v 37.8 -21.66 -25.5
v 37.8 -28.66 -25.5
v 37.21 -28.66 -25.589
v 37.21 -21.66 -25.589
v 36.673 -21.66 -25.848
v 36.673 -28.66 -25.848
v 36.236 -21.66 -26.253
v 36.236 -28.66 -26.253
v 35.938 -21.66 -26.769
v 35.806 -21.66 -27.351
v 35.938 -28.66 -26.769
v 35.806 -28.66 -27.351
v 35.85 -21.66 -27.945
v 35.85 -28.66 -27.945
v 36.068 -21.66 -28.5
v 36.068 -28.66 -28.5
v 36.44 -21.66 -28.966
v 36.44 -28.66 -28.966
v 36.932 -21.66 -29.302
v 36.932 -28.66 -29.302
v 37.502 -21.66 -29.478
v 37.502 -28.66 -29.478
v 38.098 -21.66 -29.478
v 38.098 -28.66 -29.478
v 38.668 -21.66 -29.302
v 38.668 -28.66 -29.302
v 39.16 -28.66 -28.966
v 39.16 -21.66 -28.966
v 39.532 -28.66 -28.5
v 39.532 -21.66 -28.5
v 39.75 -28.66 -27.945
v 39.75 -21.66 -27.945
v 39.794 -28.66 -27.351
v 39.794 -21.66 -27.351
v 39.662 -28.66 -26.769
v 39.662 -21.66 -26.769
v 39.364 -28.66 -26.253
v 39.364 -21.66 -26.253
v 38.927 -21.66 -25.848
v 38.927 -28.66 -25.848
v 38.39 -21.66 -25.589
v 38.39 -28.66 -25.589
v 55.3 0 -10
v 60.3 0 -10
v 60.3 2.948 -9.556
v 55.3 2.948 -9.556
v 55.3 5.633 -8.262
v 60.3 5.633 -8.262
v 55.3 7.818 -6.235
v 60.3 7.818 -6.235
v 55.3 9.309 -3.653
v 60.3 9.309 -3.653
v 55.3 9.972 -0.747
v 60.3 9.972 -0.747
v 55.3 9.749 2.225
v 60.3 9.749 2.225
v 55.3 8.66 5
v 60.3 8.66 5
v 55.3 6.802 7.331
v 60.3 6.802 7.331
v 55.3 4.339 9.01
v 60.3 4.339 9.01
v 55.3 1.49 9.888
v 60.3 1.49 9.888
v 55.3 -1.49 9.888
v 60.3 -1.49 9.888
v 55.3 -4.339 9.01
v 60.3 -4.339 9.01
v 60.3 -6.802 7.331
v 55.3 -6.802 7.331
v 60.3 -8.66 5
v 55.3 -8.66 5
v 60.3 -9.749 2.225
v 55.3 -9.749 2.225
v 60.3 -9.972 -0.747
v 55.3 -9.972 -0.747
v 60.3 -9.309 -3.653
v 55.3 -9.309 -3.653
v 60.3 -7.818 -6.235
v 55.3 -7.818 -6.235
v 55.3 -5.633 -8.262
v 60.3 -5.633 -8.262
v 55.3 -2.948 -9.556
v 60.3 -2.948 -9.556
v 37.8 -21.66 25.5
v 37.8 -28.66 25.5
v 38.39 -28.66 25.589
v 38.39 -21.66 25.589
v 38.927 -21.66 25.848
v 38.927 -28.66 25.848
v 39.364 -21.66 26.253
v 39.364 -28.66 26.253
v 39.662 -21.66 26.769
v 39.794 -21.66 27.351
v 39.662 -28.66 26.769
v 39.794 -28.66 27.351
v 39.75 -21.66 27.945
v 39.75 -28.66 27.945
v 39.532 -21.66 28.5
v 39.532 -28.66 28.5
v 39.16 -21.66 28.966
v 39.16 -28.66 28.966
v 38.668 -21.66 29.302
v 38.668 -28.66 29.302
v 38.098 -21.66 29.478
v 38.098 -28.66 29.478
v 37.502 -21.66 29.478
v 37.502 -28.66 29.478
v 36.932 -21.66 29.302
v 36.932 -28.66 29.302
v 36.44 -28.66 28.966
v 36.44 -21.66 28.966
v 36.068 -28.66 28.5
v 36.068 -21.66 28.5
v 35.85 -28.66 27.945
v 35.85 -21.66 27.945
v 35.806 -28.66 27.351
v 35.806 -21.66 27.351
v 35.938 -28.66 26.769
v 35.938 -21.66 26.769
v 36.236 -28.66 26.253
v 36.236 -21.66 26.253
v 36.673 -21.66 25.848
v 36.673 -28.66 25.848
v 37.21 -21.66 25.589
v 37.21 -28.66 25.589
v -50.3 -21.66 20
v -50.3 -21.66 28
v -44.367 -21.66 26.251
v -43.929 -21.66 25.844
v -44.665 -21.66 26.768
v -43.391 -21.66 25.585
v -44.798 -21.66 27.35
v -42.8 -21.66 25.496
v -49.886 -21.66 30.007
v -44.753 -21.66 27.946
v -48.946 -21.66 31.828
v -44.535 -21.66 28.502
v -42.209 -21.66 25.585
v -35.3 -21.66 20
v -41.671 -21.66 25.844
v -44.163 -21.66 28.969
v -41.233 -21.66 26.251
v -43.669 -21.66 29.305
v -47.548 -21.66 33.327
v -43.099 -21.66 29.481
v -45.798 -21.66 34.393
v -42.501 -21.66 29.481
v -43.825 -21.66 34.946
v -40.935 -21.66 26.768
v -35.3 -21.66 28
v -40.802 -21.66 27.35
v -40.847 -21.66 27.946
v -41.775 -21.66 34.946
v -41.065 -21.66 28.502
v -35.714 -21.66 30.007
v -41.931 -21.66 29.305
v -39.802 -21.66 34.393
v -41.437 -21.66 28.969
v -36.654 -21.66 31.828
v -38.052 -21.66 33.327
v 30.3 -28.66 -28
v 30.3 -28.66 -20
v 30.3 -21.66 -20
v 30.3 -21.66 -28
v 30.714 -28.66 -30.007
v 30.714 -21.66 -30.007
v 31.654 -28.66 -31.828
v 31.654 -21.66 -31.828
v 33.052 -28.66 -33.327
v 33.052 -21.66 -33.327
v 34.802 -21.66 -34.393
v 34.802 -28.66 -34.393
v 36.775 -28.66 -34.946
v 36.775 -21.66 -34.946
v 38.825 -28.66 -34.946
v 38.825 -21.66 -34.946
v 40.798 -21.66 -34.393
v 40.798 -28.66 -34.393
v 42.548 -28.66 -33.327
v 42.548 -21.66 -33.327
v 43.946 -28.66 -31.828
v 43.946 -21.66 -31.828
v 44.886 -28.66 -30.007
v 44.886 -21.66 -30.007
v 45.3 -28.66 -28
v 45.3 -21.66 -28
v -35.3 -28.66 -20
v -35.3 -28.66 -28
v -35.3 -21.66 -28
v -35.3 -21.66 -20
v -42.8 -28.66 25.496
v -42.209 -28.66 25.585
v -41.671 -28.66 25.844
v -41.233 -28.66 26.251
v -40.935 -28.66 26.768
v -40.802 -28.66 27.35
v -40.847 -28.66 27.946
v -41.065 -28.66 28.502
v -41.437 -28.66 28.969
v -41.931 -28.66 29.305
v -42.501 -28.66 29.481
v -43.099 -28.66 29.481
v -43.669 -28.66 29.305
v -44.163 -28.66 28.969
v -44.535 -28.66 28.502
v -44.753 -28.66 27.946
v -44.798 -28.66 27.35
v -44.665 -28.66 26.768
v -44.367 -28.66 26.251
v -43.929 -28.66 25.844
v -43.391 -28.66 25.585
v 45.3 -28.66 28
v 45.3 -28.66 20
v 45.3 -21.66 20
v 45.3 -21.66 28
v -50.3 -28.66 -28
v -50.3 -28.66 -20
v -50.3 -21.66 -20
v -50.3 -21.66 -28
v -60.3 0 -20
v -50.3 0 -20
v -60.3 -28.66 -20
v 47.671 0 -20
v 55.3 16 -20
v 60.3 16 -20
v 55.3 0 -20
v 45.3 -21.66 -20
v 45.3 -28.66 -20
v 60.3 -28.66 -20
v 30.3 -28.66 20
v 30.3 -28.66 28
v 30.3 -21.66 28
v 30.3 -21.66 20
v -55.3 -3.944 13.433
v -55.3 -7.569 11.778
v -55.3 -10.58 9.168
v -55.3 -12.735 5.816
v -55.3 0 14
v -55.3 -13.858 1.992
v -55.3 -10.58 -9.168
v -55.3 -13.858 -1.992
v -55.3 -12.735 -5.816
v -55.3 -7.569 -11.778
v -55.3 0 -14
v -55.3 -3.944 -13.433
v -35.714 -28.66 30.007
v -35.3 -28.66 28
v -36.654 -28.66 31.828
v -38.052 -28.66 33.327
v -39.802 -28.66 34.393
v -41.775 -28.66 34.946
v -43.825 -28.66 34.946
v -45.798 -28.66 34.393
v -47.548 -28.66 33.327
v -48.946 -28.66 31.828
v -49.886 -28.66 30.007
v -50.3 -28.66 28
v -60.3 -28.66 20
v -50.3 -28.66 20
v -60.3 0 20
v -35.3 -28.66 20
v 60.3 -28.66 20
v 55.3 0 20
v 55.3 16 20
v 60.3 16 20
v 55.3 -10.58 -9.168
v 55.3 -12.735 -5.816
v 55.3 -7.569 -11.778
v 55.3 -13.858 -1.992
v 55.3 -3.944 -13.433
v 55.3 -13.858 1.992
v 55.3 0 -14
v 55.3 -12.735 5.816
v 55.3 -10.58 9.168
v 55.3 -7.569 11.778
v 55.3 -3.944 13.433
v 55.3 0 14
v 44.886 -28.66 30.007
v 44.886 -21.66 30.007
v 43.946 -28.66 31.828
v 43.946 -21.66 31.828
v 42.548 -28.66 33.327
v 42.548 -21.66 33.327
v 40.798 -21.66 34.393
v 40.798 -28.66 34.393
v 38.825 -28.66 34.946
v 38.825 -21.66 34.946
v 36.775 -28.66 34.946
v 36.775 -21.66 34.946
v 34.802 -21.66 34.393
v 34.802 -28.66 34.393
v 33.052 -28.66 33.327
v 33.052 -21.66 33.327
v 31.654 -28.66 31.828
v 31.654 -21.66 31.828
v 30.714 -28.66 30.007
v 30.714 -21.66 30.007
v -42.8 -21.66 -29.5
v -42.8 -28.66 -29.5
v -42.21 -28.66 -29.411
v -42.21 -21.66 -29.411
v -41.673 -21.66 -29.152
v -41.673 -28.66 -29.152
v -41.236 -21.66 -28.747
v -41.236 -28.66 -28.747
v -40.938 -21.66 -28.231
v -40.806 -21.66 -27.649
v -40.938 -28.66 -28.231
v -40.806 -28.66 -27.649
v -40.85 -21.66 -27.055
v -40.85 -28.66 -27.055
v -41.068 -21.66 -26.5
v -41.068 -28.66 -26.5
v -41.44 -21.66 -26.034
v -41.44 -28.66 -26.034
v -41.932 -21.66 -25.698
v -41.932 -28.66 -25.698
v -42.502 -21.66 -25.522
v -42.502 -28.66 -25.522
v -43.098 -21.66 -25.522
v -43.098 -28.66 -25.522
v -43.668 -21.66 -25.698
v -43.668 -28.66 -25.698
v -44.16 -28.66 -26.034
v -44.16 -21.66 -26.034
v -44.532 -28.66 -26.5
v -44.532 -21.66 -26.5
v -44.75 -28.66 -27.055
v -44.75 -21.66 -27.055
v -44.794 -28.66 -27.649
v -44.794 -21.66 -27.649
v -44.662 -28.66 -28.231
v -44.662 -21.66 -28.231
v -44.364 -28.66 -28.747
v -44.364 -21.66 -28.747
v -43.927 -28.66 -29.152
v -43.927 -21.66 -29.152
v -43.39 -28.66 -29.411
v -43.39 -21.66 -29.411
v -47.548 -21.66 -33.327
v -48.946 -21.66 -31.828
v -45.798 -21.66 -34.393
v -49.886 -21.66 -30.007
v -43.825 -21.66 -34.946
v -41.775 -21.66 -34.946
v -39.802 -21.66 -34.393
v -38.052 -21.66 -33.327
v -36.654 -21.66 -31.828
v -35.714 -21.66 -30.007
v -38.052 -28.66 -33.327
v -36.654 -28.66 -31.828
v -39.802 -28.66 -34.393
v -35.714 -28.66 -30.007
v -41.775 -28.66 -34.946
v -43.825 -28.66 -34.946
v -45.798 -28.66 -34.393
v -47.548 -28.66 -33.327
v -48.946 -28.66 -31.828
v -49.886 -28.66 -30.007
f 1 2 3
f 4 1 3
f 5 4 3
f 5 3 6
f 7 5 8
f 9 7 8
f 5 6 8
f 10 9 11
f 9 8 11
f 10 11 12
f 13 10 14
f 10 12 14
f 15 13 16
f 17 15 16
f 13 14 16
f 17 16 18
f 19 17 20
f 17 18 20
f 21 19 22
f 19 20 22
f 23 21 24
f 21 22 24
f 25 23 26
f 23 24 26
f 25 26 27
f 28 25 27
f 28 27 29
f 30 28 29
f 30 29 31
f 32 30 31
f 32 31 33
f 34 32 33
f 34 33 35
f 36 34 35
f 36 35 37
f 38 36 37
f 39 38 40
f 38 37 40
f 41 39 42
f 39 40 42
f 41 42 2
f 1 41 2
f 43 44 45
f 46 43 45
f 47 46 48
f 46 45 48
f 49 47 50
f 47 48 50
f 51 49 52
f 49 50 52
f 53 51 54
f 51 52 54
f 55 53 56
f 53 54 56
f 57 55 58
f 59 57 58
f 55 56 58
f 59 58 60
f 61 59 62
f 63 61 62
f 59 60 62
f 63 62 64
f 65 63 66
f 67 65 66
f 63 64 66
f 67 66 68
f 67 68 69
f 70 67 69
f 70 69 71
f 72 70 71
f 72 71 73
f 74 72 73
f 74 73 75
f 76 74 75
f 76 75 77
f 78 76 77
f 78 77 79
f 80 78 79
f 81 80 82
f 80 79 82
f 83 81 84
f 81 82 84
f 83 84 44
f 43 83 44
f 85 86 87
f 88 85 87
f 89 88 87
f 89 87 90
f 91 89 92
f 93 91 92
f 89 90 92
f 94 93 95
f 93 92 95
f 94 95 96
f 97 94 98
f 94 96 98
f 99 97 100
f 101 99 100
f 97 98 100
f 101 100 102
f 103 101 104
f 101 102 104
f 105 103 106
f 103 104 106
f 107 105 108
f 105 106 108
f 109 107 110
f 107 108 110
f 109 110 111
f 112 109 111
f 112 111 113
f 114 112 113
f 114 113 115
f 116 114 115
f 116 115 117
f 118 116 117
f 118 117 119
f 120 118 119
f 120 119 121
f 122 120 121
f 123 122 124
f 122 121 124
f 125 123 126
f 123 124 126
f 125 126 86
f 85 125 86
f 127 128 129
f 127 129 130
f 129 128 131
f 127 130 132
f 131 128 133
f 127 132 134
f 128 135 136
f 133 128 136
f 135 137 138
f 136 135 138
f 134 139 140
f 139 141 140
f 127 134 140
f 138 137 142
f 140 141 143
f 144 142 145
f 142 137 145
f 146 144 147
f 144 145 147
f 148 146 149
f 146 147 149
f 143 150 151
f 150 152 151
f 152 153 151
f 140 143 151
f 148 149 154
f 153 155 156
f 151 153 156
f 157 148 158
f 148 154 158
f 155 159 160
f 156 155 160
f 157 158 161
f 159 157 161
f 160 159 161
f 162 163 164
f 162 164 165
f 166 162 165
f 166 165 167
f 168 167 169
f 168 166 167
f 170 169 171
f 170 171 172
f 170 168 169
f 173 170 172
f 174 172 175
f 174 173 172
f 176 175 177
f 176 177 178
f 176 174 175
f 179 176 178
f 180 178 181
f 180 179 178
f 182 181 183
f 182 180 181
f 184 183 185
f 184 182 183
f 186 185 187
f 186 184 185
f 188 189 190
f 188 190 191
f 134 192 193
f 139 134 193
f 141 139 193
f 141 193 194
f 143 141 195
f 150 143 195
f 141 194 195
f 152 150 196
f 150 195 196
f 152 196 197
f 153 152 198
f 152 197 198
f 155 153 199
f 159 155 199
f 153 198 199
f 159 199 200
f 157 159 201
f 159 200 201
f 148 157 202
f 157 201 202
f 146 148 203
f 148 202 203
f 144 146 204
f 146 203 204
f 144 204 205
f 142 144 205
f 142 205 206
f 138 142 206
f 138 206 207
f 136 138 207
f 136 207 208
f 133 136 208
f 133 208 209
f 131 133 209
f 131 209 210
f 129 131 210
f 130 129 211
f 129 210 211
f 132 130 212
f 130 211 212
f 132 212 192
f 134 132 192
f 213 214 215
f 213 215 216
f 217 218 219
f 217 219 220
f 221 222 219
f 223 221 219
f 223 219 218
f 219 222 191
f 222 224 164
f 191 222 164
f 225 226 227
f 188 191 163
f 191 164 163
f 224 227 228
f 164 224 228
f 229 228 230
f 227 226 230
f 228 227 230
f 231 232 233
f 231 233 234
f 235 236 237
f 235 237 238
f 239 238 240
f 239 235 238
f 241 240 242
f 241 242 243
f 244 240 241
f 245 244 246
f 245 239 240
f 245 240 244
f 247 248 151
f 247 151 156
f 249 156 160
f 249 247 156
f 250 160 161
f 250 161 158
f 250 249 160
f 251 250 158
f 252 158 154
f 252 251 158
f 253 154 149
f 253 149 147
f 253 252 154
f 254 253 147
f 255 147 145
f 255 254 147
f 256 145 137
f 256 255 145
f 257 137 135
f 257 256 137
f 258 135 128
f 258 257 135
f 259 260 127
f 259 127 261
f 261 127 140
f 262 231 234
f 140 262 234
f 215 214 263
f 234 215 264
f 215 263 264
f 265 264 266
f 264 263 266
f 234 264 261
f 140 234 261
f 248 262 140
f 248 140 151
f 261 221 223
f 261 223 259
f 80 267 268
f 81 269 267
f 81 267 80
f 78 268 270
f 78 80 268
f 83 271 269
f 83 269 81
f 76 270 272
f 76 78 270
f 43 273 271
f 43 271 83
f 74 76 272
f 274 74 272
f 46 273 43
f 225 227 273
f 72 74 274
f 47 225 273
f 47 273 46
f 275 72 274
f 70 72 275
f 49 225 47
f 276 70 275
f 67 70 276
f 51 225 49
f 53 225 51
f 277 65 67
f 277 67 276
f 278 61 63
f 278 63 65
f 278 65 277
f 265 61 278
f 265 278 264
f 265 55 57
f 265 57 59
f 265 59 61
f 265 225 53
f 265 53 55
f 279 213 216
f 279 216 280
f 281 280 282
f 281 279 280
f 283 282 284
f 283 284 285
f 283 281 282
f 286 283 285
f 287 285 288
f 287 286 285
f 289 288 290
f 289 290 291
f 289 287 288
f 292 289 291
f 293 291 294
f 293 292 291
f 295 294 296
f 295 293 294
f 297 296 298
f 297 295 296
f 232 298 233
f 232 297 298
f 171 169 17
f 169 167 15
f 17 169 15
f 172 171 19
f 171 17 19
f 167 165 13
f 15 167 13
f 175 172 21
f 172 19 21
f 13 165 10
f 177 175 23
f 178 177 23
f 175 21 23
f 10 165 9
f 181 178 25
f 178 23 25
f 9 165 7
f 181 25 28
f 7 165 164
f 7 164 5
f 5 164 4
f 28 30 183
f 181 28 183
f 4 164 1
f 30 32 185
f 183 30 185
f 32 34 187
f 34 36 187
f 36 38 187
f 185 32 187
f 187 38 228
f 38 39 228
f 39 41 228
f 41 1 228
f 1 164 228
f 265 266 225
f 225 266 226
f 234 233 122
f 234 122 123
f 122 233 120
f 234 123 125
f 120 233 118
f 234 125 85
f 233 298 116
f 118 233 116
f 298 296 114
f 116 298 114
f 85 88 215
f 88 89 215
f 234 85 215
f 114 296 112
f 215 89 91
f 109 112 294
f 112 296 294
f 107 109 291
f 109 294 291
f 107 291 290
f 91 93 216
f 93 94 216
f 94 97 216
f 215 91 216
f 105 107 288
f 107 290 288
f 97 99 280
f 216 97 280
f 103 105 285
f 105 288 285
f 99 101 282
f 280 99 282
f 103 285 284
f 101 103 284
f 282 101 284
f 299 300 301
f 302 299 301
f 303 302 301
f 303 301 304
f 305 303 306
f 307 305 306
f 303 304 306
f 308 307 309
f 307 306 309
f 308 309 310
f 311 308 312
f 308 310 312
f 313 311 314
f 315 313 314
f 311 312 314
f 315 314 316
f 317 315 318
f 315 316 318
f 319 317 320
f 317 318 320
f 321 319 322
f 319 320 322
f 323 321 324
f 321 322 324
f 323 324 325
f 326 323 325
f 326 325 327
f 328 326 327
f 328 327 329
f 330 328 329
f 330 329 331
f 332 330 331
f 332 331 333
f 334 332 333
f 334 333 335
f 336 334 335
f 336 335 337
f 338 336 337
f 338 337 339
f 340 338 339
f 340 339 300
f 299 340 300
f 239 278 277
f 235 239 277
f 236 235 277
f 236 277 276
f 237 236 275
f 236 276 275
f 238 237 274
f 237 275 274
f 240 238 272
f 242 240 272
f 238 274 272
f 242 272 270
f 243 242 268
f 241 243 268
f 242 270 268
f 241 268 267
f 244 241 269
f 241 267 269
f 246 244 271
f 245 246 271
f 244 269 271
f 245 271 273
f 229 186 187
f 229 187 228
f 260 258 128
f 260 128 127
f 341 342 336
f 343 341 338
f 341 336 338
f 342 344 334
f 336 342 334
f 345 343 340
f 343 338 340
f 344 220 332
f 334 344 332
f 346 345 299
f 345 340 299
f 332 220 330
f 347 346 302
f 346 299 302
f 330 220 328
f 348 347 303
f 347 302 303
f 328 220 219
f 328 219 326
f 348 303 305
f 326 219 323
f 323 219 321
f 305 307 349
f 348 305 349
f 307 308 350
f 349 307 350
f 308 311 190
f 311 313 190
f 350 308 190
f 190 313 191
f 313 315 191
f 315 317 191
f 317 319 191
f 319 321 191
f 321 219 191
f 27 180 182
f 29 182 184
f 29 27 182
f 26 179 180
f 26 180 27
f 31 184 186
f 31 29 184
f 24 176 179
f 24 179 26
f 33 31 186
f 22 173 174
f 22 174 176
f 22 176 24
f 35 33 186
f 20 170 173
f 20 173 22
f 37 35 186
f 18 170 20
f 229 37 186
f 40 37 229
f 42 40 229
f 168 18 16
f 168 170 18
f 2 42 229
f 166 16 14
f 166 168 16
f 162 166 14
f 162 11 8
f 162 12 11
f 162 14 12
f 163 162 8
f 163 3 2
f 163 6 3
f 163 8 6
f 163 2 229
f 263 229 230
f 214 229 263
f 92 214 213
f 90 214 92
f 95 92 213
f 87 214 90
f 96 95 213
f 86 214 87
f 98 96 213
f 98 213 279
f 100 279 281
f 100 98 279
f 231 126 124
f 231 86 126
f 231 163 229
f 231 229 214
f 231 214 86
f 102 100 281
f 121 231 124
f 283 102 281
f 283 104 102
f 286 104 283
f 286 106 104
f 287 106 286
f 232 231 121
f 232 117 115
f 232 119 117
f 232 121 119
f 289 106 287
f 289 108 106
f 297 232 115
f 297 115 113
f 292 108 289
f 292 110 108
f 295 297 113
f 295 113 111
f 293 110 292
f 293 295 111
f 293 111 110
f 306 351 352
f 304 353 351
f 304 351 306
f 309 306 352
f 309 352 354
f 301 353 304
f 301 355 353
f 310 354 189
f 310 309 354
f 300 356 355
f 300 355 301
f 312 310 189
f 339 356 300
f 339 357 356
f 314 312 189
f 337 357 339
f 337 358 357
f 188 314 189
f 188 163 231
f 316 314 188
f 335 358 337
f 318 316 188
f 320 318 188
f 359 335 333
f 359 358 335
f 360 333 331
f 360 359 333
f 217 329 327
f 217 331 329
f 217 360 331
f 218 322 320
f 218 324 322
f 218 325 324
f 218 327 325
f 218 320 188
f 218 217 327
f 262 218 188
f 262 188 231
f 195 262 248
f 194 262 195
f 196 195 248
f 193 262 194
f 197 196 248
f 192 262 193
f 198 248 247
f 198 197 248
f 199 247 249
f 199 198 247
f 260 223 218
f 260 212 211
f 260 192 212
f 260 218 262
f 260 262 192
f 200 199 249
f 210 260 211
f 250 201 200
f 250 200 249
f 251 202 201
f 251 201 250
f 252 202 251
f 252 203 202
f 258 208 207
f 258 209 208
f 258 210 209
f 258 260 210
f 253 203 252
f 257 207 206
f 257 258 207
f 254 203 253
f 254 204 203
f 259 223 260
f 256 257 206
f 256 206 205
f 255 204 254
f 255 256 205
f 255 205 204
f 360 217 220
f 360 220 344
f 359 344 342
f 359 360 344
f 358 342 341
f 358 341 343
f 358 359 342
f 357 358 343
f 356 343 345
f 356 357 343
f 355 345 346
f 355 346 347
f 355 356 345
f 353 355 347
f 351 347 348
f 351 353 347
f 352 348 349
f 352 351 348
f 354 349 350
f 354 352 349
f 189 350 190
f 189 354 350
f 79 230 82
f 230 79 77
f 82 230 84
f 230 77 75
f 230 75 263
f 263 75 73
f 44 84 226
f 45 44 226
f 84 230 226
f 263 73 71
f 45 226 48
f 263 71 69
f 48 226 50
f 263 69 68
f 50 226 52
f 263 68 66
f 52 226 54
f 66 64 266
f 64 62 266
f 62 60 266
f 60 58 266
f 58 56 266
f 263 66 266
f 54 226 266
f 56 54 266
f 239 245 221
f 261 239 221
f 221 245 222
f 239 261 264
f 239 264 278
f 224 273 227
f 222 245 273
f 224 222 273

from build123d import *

# Parameters (mm, degrees)
BOSS_EXTRUDE1_DEPTH     = 55.3
SKETCH3_W               = 40
SKETCH3_H               = 19
BOSS_EXTRUDE2_DEPTH     = 5
SKETCH5_R               = 10
CUT_EXTRUDE1_DEPTH      = 10
SKETCH6_W               = 15
SKETCH6_H               = 15
SKETCH6_R               = 2
BOSS_EXTRUDE3_DEPTH     = 5
BOSS_EXTRUDE3_2_DEPTH   = 5
BOSS_EXTRUDE3_3_DEPTH   = 5
BOSS_EXTRUDE3_4_DEPTH   = 5
FILLET5_R               = 7
FILLET2_R               = 7
FILLET3_R               = 7
FILLET4_R               = 7
BOSS_EXTRU_1_START      = 110.6
BOSS_EXTRU_1_DEPTH      = 110.6
ESQUISSE11_W            = 40
ESQUISSE11_H            = 9.66
BOSS_EXTRU_5_DEPTH      = 120.6
ESQUISSE12_R            = 2.003722313
ESQUISSE12_R_2          = 2
BOSS_EXTRU_6_DEPTH      = 7
ESQUISSE13_W            = 97.971196864
ESQUISSE13_H            = 26.942074747
ENL_V_MAT_EXTRU_2_DEPTH = 20
ESQUISSE16_R            = 2
ENL_V_MAT_EXTRU_3_DEPTH = 20
BOSS_EXTRU_7_DEPTH      = 5


with BuildPart() as part:
    # Sketch1 → Boss-Extrude1 (new, symmetric)
    with BuildSketch(Plane(origin=(0, 0, 0), x_dir=(0, 0, -1), z_dir=(1, 0, 0))):
        with BuildLine():
            ThreePointArc((-15, 0), (0, -15), (15, 0))
            Line((15, 0), (20, 0))
            Line((20, 0), (20, -19))
            Line((20, -19), (-20, -19))
            Line((-20, -19), (-20, 0))
            Line((-20, 0), (-15, 0))
        make_face()
    extrude(amount=BOSS_EXTRUDE1_DEPTH, both=True)

    # Sketch3 → Boss-Extrude2 (add)
    with BuildSketch(Plane(origin=(55.3, 0, 0), x_dir=(0, 0, -1), z_dir=(1, 0, 0))):
        with Locations((0, -9.5)):
            Rectangle(SKETCH3_W, SKETCH3_H)
    boss_extrude2 = extrude(amount=BOSS_EXTRUDE2_DEPTH)

    # Mirror1: Boss-Extrude2 across plane
    add(boss_extrude2.mirror(Plane(origin=(0, 0, 0), x_dir=(0, 0, 1), z_dir=(1, 0, 0))))

    # Sketch5 → Cut-Extrude1 (cut)
    with BuildSketch(Plane(origin=(60.3, 0, 0), x_dir=(0, 0, -1), z_dir=(1, 0, 0))):
        Circle(SKETCH5_R)
    extrude(amount=-CUT_EXTRUDE1_DEPTH, mode=Mode.SUBTRACT)

    # Esquisse3 → Boss.-Extru.1 (add)
    with BuildSketch(Plane(origin=(-55.3, 0, 0), x_dir=(0, 0, -1), z_dir=(1, 0, 0)).offset(BOSS_EXTRU_1_START)):
        with BuildLine():
            Line((-15, 0), (-14, 0))
            ThreePointArc((-14, 0), (0, -14), (14, 0))
            Line((14, 0), (15, 0))
            ThreePointArc((15, 0), (0, -15), (-15, 0))
        make_face()
    extrude(amount=-BOSS_EXTRU_1_DEPTH)



with BuildPart() as body_2:
    # Sketch6 → Boss-Extrude3 (new body)
    with BuildSketch(Plane.XZ.offset(19)):
        with Locations((37.8, 27.5)):
            Rectangle(SKETCH6_W, SKETCH6_H)
        with Locations(Location((37.8, 27.5, 0), (0, 0, 270))):
            Circle(SKETCH6_R, mode=Mode.SUBTRACT)
    extrude(amount=-BOSS_EXTRUDE3_DEPTH)

    # Fillet5
    fillet5_edges = [body_2.edges().sort_by_distance(p)[0] for p in [
        (30.3, -16.5, 35),
        (45.3, -16.5, 35),
    ]]
    fillet(fillet5_edges, radius=FILLET5_R)


with BuildPart() as body_3:
    # Sketch6 → Boss-Extrude3 2 (new body)
    with BuildSketch(Plane.XZ.offset(19)):
        with Locations((-42.8, 27.5)):
            Rectangle(SKETCH6_W, SKETCH6_H)
        with Locations(Location((-42.8, 27.5, 0), (0, 0, 270))):
            Circle(SKETCH6_R, mode=Mode.SUBTRACT)
    extrude(amount=-BOSS_EXTRUDE3_2_DEPTH)

    # Fillet2
    fillet2_edges = [body_3.edges().sort_by_distance(p)[0] for p in [
        (-35.3, -16.5, 35),
        (-50.3, -16.5, 35),
    ]]
    fillet(fillet2_edges, radius=FILLET2_R)


with BuildPart() as body_4:
    # Sketch6 → Boss-Extrude3 3 (new body)
    with BuildSketch(Plane.XZ.offset(19)):
        with Locations((37.8, -27.5)):
            Rectangle(SKETCH6_W, SKETCH6_H)
        with Locations(Location((37.8, -27.5, 0), (0, 0, 90))):
            Circle(SKETCH6_R, mode=Mode.SUBTRACT)
    extrude(amount=-BOSS_EXTRUDE3_3_DEPTH)

    # Fillet4
    fillet4_edges = [body_4.edges().sort_by_distance(p)[0] for p in [
        (30.3, -16.5, -35),
        (45.3, -16.5, -35),
    ]]
    fillet(fillet4_edges, radius=FILLET4_R)


with BuildPart() as body_5:
    # Sketch6 → Boss-Extrude3 4 (new body)
    with BuildSketch(Plane.XZ.offset(19)):
        with Locations((-42.8, -27.5)):
            Rectangle(SKETCH6_W, SKETCH6_H)
        with Locations(Location((-42.8, -27.5, 0), (0, 0, 90))):
            Circle(SKETCH6_R, mode=Mode.SUBTRACT)
    extrude(amount=-BOSS_EXTRUDE3_4_DEPTH)

    # Fillet3
    fillet3_edges = [body_5.edges().sort_by_distance(p)[0] for p in [
        (-50.3, -16.5, -35),
        (-35.3, -16.5, -35),
    ]]
    fillet(fillet3_edges, radius=FILLET3_R)


with BuildPart() as part_1:
    add(part.part)

    add(body_2.part)  # Boss.-Extru.5 merges body 2

    add(body_3.part)  # Boss.-Extru.5 merges body 3

    add(body_4.part)  # Boss.-Extru.5 merges body 4

    add(body_5.part)  # Boss.-Extru.5 merges body 5
    # Esquisse11 → Boss.-Extru.5 (add)
    with BuildSketch(Plane.ZY.offset(60.3)):
        with Locations((0, -23.83)):
            Rectangle(ESQUISSE11_W, ESQUISSE11_H)
    extrude(amount=-BOSS_EXTRU_5_DEPTH)

    # Esquisse12 → Boss.-Extru.6 (add)
    # profile 1 of 4: a face of its own
    with BuildSketch(Plane.XZ.offset(28.66)):
        with BuildLine():
            Line((-50.3, 28), (-50.3, 20))
            Line((-50.3, 20), (-35.3, 20))
            Line((-35.3, 20), (-35.3, 28))
            ThreePointArc((-35.3, 28), (-42.8, 35.016648189), (-50.3, 28))
        make_face()
        with Locations(Location((-42.8, 27.5, 0), (0, 0, 270))):
            Circle(ESQUISSE12_R, mode=Mode.SUBTRACT)
    # profile 2 of 4: a face of its own
    with BuildSketch(Plane.XZ.offset(28.66)):
        with BuildLine():
            Line((-35.3, -20), (-50.3, -20))
            Line((-50.3, -20), (-50.3, -28))
            ThreePointArc((-50.3, -28), (-42.8, -35.016648189), (-35.3, -28))
            Line((-35.3, -28), (-35.3, -20))
        make_face()
    # profile 3 of 4: a face of its own
    with BuildSketch(Plane.XZ.offset(28.66)):
        with BuildLine():
            Line((45.3, -20), (30.3, -20))
            Line((30.3, -20), (30.3, -28))
            ThreePointArc((30.3, -28), (37.8, -35.016648189), (45.3, -28))
            Line((45.3, -28), (45.3, -20))
        make_face()
        with Locations(Location((37.8, -27.5, 0), (0, 0, 90))):
            Circle(ESQUISSE12_R_2, mode=Mode.SUBTRACT)
    # profile 4 of 4: a face of its own
    with BuildSketch(Plane.XZ.offset(28.66)):
        with BuildLine():
            Line((30.3, 28), (30.3, 20))
            Line((30.3, 20), (45.3, 20))
            Line((45.3, 20), (45.3, 28))
            ThreePointArc((45.3, 28), (37.8, 35.016648189), (30.3, 28))
        make_face()
        with Locations(Location((37.8, 27.5, 0), (0, 0, 270))):
            Circle(ESQUISSE12_R_2, mode=Mode.SUBTRACT)
    extrude(amount=-BOSS_EXTRU_6_DEPTH)

    # Esquisse13 → Enlèv. mat.-Extru.2 (cut)
    with BuildSketch(Plane(origin=(0, 0, 0), x_dir=(1, 0, 0), z_dir=(0, 1, 0))):
        Polygon((-50.3, -20), (-50.3, -48.328087832), (45.678803054, -48.328087832), (45.3, -20), align=None)
        with Locations((-1.314401568, 33.471037373)):
            Rectangle(ESQUISSE13_W, ESQUISSE13_H)
    extrude(amount=-ENL_V_MAT_EXTRU_2_DEPTH, mode=Mode.SUBTRACT)

    # Esquisse16 → Enlèv. mat.-Extru.3 (cut)
    with BuildSketch(Plane.XZ.offset(28.66)):
        with Locations(Location((-42.8, -27.5, 0), (0, 0, 270))):
            Circle(ESQUISSE16_R)
    extrude(amount=-ENL_V_MAT_EXTRU_3_DEPTH, mode=Mode.SUBTRACT)

    # Esquisse18 → Boss.-Extru.7 (add)
    with BuildSketch(Plane(origin=(60.3, 0, 0), x_dir=(0, 0, -1), z_dir=(1, 0, 0))):
        with BuildLine():
            Line((-20, 0), (-20, 16))
            Line((-20, 16), (20, 16))
            Line((20, 16), (20, 0))
            Line((20, 0), (10, 0))
            ThreePointArc((10, 0), (0, 10), (-10, 0))
            Line((-10, 0), (-20, 0))
        make_face()
    extrude(amount=-BOSS_EXTRU_7_DEPTH)


solid = part_1.part
